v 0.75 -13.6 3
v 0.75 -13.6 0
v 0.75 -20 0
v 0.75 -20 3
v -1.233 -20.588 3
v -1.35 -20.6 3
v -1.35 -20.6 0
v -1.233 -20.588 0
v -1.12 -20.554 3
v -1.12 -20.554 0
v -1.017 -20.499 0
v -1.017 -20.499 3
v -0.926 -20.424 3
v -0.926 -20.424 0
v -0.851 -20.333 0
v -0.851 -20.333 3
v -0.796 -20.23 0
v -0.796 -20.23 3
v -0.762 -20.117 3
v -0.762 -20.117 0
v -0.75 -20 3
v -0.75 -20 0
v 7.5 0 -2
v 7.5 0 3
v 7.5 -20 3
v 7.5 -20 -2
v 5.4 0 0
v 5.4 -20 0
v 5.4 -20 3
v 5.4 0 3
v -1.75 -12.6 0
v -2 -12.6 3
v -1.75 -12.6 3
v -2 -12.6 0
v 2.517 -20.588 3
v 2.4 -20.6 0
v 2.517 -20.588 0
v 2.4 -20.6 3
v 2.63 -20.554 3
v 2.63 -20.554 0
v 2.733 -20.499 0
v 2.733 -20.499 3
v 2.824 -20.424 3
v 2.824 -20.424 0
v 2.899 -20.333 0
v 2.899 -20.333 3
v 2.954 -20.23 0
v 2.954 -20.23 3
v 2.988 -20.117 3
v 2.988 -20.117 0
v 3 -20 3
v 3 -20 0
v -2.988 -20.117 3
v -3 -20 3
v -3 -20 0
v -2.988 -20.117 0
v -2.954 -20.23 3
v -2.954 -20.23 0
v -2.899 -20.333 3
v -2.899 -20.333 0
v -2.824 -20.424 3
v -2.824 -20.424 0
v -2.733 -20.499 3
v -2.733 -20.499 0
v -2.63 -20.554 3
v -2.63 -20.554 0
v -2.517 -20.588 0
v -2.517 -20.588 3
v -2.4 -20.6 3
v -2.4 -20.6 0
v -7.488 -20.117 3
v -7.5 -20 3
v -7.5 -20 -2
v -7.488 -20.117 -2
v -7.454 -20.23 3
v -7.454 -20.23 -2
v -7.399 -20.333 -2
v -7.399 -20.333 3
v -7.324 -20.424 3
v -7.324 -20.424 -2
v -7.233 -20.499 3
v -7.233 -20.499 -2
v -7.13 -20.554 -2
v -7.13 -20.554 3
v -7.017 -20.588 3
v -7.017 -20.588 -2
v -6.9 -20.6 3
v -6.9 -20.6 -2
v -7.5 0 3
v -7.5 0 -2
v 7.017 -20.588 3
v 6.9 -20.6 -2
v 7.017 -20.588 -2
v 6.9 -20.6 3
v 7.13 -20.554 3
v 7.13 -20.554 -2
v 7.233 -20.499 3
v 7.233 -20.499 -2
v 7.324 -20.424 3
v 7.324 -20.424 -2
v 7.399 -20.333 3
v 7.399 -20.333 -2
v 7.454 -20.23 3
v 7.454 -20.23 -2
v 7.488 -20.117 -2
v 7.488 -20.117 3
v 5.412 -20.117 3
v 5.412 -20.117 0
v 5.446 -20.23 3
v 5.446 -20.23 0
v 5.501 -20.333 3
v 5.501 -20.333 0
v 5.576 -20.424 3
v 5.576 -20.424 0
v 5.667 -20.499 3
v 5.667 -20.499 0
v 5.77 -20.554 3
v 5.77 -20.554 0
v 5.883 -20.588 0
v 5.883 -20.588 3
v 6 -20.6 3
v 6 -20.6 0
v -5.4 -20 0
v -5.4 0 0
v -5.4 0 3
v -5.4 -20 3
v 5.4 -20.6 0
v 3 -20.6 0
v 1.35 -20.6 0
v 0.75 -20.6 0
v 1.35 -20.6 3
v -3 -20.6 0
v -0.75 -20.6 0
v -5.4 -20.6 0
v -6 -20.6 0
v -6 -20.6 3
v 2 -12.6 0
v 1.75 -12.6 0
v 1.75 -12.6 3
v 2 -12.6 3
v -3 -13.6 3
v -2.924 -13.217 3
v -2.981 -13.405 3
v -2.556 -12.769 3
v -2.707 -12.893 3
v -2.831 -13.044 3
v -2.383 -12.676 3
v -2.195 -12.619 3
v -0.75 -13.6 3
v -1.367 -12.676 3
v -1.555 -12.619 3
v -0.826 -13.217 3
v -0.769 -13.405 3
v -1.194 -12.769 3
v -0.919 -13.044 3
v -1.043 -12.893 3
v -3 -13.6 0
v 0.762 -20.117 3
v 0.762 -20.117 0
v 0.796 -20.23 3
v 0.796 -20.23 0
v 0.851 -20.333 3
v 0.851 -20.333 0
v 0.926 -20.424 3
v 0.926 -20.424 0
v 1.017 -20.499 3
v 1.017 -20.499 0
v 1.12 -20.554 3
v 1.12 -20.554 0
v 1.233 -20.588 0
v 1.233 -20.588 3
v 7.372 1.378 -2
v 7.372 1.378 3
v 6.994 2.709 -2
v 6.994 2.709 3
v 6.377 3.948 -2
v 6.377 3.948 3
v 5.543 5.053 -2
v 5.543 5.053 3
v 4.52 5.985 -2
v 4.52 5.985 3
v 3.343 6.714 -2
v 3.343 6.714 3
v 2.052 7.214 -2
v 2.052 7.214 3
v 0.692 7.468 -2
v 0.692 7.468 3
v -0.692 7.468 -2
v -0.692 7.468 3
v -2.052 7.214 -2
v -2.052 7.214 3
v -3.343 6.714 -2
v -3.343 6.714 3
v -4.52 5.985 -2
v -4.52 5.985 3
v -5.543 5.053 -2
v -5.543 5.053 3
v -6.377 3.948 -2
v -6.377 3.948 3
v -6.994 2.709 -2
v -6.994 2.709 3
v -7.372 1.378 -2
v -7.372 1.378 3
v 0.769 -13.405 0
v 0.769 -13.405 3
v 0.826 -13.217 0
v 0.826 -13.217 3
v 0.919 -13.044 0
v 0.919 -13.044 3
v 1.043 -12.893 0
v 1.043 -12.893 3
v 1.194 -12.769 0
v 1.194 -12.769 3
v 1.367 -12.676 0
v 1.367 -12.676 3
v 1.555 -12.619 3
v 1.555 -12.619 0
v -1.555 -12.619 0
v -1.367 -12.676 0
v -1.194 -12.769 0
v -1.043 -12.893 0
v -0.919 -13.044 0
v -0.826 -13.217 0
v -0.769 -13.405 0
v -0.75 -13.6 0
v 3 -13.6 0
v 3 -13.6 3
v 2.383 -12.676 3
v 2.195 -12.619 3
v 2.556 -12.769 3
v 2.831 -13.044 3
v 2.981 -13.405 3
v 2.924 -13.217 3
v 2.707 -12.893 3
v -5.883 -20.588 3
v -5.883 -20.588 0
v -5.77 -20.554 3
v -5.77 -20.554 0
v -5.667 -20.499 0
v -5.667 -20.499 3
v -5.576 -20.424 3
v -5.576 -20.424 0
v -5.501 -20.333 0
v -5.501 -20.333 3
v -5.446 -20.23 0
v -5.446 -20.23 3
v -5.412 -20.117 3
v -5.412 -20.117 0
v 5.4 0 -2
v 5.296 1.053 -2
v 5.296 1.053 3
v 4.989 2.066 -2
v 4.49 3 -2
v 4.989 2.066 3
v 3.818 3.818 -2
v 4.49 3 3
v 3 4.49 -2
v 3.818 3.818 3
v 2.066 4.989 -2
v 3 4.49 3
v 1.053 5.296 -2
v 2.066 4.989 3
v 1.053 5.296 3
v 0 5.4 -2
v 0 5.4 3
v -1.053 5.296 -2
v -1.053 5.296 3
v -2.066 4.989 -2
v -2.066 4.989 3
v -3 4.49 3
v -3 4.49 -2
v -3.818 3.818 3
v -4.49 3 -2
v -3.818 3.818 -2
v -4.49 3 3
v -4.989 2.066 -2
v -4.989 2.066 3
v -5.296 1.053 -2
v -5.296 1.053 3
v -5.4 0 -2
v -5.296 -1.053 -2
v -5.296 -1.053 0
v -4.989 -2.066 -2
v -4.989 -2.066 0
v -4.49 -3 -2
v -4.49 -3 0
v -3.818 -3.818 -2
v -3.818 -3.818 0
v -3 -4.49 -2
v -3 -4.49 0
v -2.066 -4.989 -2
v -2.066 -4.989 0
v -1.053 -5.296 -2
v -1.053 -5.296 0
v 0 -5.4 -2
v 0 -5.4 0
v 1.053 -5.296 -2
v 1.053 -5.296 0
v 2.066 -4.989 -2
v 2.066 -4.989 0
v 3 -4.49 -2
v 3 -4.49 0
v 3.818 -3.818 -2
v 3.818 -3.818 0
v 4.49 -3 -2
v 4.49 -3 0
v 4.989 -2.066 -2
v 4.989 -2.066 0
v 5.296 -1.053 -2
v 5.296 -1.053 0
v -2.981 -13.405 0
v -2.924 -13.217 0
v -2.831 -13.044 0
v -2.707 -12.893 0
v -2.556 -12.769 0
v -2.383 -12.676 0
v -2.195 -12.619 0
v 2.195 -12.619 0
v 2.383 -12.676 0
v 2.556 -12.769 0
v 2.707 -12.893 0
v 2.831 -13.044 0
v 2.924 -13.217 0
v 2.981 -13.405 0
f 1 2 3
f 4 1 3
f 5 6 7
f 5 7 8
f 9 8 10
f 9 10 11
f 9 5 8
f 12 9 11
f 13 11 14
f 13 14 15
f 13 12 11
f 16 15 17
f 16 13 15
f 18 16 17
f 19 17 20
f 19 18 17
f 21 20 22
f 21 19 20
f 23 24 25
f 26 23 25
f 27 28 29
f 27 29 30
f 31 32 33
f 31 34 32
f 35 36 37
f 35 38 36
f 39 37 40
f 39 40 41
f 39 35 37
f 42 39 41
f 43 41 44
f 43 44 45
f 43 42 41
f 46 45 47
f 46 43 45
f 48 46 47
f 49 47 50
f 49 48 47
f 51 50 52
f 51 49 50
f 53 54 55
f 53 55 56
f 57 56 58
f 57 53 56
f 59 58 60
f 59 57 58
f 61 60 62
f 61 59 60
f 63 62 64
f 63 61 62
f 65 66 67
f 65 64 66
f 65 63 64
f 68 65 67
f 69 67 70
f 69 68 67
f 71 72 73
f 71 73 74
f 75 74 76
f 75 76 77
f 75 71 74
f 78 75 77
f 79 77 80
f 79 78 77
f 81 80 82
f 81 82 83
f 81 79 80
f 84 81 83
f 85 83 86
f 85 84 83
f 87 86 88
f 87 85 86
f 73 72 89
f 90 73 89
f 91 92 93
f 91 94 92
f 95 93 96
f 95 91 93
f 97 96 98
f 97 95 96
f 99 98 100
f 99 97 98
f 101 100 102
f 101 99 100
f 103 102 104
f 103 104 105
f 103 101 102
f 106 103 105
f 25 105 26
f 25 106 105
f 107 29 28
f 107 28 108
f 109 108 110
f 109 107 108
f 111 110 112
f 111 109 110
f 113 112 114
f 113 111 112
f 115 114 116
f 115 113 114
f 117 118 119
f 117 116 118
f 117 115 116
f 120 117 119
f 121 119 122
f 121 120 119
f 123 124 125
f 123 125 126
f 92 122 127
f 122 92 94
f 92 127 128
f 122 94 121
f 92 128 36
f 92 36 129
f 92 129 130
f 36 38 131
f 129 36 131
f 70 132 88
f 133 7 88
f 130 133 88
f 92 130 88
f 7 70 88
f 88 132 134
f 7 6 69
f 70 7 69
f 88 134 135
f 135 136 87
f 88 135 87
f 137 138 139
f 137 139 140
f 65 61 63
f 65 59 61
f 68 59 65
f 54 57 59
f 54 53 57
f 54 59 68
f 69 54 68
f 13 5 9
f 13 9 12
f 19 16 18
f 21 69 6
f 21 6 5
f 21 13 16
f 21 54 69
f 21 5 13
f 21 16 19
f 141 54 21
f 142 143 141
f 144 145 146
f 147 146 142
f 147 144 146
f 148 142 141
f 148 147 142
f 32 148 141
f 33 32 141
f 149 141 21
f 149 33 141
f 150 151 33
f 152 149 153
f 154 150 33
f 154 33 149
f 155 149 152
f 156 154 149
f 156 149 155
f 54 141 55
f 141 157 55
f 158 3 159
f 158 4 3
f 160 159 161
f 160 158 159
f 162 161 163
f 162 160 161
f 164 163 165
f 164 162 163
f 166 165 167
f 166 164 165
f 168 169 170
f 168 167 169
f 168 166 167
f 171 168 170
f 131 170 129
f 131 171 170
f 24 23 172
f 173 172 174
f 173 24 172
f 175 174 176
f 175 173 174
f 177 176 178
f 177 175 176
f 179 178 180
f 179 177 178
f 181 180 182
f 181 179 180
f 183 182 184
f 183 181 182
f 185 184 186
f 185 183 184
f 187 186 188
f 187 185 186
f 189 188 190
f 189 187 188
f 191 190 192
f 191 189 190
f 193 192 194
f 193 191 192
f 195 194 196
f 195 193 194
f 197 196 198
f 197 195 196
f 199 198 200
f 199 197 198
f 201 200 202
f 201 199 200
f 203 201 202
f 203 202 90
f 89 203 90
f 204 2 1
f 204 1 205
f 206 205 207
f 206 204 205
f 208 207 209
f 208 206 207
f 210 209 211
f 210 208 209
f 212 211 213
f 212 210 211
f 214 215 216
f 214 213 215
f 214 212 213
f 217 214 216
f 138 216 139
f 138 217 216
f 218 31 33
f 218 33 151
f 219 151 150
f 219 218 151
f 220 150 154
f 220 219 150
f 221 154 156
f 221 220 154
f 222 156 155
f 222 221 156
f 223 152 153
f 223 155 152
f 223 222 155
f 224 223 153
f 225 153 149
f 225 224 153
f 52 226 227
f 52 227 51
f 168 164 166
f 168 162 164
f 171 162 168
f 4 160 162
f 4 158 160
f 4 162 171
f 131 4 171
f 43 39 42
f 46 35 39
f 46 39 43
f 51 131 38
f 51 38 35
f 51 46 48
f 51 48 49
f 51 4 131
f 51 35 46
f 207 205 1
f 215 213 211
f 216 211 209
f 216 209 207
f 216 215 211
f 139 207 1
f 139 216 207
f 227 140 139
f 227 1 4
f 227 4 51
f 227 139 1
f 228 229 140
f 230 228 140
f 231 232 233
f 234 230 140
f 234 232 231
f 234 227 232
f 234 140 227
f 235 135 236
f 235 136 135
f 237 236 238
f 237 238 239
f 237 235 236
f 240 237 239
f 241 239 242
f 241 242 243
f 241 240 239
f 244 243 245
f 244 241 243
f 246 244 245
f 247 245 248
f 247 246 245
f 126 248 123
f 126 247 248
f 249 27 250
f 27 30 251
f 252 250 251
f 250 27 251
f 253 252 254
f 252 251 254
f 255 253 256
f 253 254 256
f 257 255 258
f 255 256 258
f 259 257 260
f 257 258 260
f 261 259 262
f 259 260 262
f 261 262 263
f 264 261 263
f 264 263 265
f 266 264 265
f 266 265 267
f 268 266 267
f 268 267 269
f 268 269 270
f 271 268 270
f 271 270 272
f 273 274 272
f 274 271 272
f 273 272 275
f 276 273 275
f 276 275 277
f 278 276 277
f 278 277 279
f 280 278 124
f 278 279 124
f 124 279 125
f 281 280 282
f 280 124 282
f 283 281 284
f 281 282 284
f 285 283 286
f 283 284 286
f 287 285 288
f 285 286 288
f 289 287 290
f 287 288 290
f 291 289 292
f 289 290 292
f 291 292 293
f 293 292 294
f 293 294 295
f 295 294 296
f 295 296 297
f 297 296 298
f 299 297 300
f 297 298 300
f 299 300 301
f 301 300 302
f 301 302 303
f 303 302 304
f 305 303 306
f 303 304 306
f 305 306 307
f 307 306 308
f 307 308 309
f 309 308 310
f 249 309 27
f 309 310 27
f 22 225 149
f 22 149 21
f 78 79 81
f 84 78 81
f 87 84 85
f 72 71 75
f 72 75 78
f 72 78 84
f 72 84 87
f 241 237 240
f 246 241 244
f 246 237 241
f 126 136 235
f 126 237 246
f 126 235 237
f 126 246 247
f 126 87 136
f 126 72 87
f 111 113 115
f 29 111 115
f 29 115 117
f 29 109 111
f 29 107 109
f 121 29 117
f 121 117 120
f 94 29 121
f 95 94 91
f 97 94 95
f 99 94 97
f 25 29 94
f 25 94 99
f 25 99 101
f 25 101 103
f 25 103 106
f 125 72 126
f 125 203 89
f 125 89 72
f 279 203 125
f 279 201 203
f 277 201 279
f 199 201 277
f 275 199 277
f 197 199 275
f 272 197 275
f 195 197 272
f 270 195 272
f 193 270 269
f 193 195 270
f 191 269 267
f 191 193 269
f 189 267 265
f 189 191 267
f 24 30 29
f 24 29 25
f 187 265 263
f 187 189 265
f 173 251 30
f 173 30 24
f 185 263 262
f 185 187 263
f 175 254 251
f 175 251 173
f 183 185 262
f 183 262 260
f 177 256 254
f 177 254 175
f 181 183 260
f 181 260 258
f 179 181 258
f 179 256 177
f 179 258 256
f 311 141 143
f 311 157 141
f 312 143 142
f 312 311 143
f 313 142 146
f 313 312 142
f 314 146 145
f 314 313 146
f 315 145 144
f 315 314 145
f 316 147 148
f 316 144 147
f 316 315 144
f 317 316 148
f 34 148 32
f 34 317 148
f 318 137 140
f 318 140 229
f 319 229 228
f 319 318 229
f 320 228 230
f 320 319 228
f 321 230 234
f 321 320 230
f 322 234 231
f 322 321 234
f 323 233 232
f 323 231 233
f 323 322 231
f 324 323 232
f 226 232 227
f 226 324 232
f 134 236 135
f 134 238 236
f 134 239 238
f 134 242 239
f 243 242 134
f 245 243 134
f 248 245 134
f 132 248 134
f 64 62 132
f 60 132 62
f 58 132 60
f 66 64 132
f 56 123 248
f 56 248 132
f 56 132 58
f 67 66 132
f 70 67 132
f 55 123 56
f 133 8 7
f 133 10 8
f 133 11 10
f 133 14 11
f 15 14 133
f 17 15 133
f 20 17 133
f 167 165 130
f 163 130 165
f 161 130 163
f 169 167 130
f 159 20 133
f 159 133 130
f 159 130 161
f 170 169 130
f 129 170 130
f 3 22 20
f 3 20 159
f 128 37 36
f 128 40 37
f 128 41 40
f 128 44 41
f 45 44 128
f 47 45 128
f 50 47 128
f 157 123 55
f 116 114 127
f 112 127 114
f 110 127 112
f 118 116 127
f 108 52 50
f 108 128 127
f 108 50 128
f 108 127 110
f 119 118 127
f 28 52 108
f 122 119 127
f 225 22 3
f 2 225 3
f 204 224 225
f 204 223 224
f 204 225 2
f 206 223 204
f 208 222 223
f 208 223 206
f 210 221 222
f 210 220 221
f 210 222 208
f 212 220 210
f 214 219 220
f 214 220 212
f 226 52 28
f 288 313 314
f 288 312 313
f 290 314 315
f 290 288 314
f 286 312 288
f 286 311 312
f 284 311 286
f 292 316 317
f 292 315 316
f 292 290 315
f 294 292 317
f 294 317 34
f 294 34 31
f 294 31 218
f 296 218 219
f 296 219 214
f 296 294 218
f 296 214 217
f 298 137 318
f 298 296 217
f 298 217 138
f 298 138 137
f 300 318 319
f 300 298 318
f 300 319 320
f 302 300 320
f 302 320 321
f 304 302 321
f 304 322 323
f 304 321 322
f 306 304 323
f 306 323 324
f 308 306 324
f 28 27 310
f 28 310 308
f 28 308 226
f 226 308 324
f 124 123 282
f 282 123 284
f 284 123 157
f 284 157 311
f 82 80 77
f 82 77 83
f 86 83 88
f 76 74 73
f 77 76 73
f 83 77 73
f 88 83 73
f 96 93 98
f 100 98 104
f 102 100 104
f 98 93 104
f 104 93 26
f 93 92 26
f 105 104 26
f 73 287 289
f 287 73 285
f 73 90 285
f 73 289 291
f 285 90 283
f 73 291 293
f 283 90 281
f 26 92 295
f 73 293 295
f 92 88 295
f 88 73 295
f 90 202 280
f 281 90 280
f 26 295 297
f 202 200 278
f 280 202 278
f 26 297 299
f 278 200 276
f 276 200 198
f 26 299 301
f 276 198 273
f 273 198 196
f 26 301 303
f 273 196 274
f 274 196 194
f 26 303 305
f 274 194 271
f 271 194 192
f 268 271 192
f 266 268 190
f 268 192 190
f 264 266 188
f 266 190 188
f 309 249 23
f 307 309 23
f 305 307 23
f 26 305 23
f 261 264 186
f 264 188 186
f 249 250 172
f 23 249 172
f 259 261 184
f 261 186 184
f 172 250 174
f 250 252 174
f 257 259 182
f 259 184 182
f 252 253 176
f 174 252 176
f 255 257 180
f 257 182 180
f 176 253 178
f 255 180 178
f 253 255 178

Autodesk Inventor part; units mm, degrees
ref_plane "YZ Plane" through (0, 0, 0) normal (1, 0, 0) x (0, 1, 0)
ref_plane "XZ Plane" through (0, 0, 0) normal (0, 1, 0) x (-1, 0, 0)
ref_plane "XY Plane" through (0, 0, 0) normal (0, 0, 1) x (1, 0, 0)
sketch "Szkic1" plane through (0, 0, 0) normal (0, 0, 1) x (1, 0, 0)
  circle A0 centre (0, 0) radius 5.4
  line L0 (0, 5.4) -> (0, -12.6) construction
  line L1 (-5.4, 0) -> (-5.4, -12.6)
  line L2 (1.75, -12.6) -> (5.4, -12.6) construction
  line L3 (5.4, -12.6) -> (5.4, 0)
  line L4 (-4.5, -12.6) -> (-4.5, -16.6)
  line L5 (-4.5, -16.6) -> (-3, -16.6)
  line L6 (-3, -16.6) -> (-3, -13.6)
  line L7 (-3, -12.6) -> (-4.5, -12.6)
  line L8 (-4.5, -12.6) -> (-3, -16.6) construction
  line L9 (-4.5, -16.6) -> (-3, -12.6) construction
  line L10 (0.75, -12.6) -> (-0.75, -12.6)
  line L11 (0.75, -16.6) -> (0.75, -13.6)
  line L12 (-0.75, -16.6) -> (0.75, -16.6)
  line L13 (-0.75, -12.6) -> (0.75, -16.6) construction
  line L14 (-0.75, -16.6) -> (0.75, -12.6) construction
  line L15 (-0.75, -13.6) -> (-0.75, -16.6)
  line L16 (4.5, -12.6) -> (3, -12.6)
  line L17 (4.5, -16.6) -> (4.5, -12.6)
  line L18 (3, -16.6) -> (4.5, -16.6)
  line L19 (3, -12.6) -> (4.5, -16.6) construction
  line L20 (3, -16.6) -> (4.5, -12.6) construction
  line L21 (3, -13.6) -> (3, -16.6)
  line L22 (-7.5, 7.5) -> (7.5, 7.5)
  line L23 (7.5, 7.5) -> (7.5, -20.6)
  line L24 (7.5, -20.6) -> (-7.5, -20.6)
  line L25 (-7.5, -20.6) -> (-7.5, 7.5)
  line L26 (5.4, 0) -> (5.4, -20.6)
  line L27 (5.4, -20.6) -> (-5.4, -20.6) construction
  line L28 (-5.4, -20.6) -> (-5.4, 0)
  line L29 (-3, -16.6) -> (-3, -20.6)
  line L30 (-0.75, -16.6) -> (-0.75, -20.6)
  line L31 (0.75, -16.6) -> (0.75, -20.6)
  line L32 (3, -16.6) -> (3, -20.6)
  line L33 (4.5, -16.6) -> (4.5, -20.6) construction
  line L34 (2, -12.6) -> (0.75, -12.6) construction
  line L35 (-3, -12.6) -> (-1.75, -12.6) construction
  arc A1 (-2, -12.6) -> (-3, -13.6) centre (-2, -13.6) ccw
  arc A2 (-0.75, -13.6) -> (-1.75, -12.6) centre (-1.75, -13.6) ccw
  arc A3 (1.75, -12.6) -> (0.75, -13.6) centre (1.75, -13.6) ccw
  arc A4 (3, -13.6) -> (2, -12.6) centre (2, -13.6) ccw
  line L36 (-2, -12.6) -> (-1.75, -12.6)
  line L37 (1.75, -12.6) -> (2, -12.6)
  line L38 (3, -13.6) -> (3, -16.6)
  line L39 (5.4, -16.6) -> (3, -16.6) construction
  line L40 (-3, -16.6) -> (-5.4, -16.6) construction
  line L41 (-3, -16.6) -> (-3, -13.6)
  line L42 (-0.75, -13.6) -> (-0.75, -16.6)
  line L43 (0.75, -16.6) -> (0.75, -13.6)
  circle A5 centre (0, 0) radius 7.5
  line L44 (-7.5, -7.5) -> (7.5, -7.5)
  point P0 (-3.75, -14.6)
  point P1 (0, -14.6)
  point P2 (3.75, -14.6)
  point P3 (0, -14.6)
  point P4 (0, -14.6)
  point P5 (0, 5.4)
  point P6 (-3, -20.5)
  point P7 (-0.75, -20.6)
  point P8 (0.75, -13.6)
  point P9 (0.75, -20.6)
  point P10 (3, -20.6)
  point P11 (5.4, -12.6)
  point P12 (0, 7.5)
  point P13 (7.5, 0)
  point P14 (-7.5, 0)
  point P15 (-5.4, -5.2048)
  point P16 (5.4, -5.2048)
  dimension "d29" = 15
  dimension "d0" = 10.8
  dimension "d3" = 12.6
  dimension "d5" = 4
  dimension "d6" = 1.5
  dimension "d9" = 3.75
  dimension "d16" = 1
  dimension "d28" = 15
  dimension "d30" = 28.1
extrude "Wyciągnięcie proste1" add sketch "Szkic1" against normal blind 2 contours L3 A5 L1 A0 | A0 L1 A5 L3 | A5 L23 L44 L3 | L3 L44 A5 | A5 L44 L1 | L1 L44 L25 A5 | L44 L23 L24 L26 L3 | L3 L26 L24 L32 L21 A4 L37 A3 L11 L12 L15 A2 L36 A1 L6 L29 L28 L1 L44 | L1 L28 L24 L25 L44 | L24 L31 L11 A3 L37 A4 L21 L32 | L29 L6 A1 L36 A2 L15 L30 L24 | L24 L30 L12 L31
extrude "Wyciągnięcie proste2" add sketch "Szkic1" along normal blind 3 contours A0 L1 A5 L3 | A5 L23 L44 L3 | L1 L44 L25 A5 | L44 L23 L24 L26 L3 | L1 L28 L24 L25 L44 | L24 L31 L11 A3 L37 A4 L21 L32 | L29 L6 A1 L36 A2 L15 L30 L24 picked at (-5.6976, -3.095)
fillet "Zaokrąglenie1" radius 0.6 8 edges at (-7.5, -20.6, 0.5) (7.5, -20.6, 0.5) (-5.4, -20.6, 1.5) (5.4, -20.6, 1.5) (3, -20.6, 1.5) (0.75, -20.6, 1.5) (-3, -20.6, 1.5) (-0.75, -20.6, 1.5)
properties part number "potentiometr_case" material "PLA"
